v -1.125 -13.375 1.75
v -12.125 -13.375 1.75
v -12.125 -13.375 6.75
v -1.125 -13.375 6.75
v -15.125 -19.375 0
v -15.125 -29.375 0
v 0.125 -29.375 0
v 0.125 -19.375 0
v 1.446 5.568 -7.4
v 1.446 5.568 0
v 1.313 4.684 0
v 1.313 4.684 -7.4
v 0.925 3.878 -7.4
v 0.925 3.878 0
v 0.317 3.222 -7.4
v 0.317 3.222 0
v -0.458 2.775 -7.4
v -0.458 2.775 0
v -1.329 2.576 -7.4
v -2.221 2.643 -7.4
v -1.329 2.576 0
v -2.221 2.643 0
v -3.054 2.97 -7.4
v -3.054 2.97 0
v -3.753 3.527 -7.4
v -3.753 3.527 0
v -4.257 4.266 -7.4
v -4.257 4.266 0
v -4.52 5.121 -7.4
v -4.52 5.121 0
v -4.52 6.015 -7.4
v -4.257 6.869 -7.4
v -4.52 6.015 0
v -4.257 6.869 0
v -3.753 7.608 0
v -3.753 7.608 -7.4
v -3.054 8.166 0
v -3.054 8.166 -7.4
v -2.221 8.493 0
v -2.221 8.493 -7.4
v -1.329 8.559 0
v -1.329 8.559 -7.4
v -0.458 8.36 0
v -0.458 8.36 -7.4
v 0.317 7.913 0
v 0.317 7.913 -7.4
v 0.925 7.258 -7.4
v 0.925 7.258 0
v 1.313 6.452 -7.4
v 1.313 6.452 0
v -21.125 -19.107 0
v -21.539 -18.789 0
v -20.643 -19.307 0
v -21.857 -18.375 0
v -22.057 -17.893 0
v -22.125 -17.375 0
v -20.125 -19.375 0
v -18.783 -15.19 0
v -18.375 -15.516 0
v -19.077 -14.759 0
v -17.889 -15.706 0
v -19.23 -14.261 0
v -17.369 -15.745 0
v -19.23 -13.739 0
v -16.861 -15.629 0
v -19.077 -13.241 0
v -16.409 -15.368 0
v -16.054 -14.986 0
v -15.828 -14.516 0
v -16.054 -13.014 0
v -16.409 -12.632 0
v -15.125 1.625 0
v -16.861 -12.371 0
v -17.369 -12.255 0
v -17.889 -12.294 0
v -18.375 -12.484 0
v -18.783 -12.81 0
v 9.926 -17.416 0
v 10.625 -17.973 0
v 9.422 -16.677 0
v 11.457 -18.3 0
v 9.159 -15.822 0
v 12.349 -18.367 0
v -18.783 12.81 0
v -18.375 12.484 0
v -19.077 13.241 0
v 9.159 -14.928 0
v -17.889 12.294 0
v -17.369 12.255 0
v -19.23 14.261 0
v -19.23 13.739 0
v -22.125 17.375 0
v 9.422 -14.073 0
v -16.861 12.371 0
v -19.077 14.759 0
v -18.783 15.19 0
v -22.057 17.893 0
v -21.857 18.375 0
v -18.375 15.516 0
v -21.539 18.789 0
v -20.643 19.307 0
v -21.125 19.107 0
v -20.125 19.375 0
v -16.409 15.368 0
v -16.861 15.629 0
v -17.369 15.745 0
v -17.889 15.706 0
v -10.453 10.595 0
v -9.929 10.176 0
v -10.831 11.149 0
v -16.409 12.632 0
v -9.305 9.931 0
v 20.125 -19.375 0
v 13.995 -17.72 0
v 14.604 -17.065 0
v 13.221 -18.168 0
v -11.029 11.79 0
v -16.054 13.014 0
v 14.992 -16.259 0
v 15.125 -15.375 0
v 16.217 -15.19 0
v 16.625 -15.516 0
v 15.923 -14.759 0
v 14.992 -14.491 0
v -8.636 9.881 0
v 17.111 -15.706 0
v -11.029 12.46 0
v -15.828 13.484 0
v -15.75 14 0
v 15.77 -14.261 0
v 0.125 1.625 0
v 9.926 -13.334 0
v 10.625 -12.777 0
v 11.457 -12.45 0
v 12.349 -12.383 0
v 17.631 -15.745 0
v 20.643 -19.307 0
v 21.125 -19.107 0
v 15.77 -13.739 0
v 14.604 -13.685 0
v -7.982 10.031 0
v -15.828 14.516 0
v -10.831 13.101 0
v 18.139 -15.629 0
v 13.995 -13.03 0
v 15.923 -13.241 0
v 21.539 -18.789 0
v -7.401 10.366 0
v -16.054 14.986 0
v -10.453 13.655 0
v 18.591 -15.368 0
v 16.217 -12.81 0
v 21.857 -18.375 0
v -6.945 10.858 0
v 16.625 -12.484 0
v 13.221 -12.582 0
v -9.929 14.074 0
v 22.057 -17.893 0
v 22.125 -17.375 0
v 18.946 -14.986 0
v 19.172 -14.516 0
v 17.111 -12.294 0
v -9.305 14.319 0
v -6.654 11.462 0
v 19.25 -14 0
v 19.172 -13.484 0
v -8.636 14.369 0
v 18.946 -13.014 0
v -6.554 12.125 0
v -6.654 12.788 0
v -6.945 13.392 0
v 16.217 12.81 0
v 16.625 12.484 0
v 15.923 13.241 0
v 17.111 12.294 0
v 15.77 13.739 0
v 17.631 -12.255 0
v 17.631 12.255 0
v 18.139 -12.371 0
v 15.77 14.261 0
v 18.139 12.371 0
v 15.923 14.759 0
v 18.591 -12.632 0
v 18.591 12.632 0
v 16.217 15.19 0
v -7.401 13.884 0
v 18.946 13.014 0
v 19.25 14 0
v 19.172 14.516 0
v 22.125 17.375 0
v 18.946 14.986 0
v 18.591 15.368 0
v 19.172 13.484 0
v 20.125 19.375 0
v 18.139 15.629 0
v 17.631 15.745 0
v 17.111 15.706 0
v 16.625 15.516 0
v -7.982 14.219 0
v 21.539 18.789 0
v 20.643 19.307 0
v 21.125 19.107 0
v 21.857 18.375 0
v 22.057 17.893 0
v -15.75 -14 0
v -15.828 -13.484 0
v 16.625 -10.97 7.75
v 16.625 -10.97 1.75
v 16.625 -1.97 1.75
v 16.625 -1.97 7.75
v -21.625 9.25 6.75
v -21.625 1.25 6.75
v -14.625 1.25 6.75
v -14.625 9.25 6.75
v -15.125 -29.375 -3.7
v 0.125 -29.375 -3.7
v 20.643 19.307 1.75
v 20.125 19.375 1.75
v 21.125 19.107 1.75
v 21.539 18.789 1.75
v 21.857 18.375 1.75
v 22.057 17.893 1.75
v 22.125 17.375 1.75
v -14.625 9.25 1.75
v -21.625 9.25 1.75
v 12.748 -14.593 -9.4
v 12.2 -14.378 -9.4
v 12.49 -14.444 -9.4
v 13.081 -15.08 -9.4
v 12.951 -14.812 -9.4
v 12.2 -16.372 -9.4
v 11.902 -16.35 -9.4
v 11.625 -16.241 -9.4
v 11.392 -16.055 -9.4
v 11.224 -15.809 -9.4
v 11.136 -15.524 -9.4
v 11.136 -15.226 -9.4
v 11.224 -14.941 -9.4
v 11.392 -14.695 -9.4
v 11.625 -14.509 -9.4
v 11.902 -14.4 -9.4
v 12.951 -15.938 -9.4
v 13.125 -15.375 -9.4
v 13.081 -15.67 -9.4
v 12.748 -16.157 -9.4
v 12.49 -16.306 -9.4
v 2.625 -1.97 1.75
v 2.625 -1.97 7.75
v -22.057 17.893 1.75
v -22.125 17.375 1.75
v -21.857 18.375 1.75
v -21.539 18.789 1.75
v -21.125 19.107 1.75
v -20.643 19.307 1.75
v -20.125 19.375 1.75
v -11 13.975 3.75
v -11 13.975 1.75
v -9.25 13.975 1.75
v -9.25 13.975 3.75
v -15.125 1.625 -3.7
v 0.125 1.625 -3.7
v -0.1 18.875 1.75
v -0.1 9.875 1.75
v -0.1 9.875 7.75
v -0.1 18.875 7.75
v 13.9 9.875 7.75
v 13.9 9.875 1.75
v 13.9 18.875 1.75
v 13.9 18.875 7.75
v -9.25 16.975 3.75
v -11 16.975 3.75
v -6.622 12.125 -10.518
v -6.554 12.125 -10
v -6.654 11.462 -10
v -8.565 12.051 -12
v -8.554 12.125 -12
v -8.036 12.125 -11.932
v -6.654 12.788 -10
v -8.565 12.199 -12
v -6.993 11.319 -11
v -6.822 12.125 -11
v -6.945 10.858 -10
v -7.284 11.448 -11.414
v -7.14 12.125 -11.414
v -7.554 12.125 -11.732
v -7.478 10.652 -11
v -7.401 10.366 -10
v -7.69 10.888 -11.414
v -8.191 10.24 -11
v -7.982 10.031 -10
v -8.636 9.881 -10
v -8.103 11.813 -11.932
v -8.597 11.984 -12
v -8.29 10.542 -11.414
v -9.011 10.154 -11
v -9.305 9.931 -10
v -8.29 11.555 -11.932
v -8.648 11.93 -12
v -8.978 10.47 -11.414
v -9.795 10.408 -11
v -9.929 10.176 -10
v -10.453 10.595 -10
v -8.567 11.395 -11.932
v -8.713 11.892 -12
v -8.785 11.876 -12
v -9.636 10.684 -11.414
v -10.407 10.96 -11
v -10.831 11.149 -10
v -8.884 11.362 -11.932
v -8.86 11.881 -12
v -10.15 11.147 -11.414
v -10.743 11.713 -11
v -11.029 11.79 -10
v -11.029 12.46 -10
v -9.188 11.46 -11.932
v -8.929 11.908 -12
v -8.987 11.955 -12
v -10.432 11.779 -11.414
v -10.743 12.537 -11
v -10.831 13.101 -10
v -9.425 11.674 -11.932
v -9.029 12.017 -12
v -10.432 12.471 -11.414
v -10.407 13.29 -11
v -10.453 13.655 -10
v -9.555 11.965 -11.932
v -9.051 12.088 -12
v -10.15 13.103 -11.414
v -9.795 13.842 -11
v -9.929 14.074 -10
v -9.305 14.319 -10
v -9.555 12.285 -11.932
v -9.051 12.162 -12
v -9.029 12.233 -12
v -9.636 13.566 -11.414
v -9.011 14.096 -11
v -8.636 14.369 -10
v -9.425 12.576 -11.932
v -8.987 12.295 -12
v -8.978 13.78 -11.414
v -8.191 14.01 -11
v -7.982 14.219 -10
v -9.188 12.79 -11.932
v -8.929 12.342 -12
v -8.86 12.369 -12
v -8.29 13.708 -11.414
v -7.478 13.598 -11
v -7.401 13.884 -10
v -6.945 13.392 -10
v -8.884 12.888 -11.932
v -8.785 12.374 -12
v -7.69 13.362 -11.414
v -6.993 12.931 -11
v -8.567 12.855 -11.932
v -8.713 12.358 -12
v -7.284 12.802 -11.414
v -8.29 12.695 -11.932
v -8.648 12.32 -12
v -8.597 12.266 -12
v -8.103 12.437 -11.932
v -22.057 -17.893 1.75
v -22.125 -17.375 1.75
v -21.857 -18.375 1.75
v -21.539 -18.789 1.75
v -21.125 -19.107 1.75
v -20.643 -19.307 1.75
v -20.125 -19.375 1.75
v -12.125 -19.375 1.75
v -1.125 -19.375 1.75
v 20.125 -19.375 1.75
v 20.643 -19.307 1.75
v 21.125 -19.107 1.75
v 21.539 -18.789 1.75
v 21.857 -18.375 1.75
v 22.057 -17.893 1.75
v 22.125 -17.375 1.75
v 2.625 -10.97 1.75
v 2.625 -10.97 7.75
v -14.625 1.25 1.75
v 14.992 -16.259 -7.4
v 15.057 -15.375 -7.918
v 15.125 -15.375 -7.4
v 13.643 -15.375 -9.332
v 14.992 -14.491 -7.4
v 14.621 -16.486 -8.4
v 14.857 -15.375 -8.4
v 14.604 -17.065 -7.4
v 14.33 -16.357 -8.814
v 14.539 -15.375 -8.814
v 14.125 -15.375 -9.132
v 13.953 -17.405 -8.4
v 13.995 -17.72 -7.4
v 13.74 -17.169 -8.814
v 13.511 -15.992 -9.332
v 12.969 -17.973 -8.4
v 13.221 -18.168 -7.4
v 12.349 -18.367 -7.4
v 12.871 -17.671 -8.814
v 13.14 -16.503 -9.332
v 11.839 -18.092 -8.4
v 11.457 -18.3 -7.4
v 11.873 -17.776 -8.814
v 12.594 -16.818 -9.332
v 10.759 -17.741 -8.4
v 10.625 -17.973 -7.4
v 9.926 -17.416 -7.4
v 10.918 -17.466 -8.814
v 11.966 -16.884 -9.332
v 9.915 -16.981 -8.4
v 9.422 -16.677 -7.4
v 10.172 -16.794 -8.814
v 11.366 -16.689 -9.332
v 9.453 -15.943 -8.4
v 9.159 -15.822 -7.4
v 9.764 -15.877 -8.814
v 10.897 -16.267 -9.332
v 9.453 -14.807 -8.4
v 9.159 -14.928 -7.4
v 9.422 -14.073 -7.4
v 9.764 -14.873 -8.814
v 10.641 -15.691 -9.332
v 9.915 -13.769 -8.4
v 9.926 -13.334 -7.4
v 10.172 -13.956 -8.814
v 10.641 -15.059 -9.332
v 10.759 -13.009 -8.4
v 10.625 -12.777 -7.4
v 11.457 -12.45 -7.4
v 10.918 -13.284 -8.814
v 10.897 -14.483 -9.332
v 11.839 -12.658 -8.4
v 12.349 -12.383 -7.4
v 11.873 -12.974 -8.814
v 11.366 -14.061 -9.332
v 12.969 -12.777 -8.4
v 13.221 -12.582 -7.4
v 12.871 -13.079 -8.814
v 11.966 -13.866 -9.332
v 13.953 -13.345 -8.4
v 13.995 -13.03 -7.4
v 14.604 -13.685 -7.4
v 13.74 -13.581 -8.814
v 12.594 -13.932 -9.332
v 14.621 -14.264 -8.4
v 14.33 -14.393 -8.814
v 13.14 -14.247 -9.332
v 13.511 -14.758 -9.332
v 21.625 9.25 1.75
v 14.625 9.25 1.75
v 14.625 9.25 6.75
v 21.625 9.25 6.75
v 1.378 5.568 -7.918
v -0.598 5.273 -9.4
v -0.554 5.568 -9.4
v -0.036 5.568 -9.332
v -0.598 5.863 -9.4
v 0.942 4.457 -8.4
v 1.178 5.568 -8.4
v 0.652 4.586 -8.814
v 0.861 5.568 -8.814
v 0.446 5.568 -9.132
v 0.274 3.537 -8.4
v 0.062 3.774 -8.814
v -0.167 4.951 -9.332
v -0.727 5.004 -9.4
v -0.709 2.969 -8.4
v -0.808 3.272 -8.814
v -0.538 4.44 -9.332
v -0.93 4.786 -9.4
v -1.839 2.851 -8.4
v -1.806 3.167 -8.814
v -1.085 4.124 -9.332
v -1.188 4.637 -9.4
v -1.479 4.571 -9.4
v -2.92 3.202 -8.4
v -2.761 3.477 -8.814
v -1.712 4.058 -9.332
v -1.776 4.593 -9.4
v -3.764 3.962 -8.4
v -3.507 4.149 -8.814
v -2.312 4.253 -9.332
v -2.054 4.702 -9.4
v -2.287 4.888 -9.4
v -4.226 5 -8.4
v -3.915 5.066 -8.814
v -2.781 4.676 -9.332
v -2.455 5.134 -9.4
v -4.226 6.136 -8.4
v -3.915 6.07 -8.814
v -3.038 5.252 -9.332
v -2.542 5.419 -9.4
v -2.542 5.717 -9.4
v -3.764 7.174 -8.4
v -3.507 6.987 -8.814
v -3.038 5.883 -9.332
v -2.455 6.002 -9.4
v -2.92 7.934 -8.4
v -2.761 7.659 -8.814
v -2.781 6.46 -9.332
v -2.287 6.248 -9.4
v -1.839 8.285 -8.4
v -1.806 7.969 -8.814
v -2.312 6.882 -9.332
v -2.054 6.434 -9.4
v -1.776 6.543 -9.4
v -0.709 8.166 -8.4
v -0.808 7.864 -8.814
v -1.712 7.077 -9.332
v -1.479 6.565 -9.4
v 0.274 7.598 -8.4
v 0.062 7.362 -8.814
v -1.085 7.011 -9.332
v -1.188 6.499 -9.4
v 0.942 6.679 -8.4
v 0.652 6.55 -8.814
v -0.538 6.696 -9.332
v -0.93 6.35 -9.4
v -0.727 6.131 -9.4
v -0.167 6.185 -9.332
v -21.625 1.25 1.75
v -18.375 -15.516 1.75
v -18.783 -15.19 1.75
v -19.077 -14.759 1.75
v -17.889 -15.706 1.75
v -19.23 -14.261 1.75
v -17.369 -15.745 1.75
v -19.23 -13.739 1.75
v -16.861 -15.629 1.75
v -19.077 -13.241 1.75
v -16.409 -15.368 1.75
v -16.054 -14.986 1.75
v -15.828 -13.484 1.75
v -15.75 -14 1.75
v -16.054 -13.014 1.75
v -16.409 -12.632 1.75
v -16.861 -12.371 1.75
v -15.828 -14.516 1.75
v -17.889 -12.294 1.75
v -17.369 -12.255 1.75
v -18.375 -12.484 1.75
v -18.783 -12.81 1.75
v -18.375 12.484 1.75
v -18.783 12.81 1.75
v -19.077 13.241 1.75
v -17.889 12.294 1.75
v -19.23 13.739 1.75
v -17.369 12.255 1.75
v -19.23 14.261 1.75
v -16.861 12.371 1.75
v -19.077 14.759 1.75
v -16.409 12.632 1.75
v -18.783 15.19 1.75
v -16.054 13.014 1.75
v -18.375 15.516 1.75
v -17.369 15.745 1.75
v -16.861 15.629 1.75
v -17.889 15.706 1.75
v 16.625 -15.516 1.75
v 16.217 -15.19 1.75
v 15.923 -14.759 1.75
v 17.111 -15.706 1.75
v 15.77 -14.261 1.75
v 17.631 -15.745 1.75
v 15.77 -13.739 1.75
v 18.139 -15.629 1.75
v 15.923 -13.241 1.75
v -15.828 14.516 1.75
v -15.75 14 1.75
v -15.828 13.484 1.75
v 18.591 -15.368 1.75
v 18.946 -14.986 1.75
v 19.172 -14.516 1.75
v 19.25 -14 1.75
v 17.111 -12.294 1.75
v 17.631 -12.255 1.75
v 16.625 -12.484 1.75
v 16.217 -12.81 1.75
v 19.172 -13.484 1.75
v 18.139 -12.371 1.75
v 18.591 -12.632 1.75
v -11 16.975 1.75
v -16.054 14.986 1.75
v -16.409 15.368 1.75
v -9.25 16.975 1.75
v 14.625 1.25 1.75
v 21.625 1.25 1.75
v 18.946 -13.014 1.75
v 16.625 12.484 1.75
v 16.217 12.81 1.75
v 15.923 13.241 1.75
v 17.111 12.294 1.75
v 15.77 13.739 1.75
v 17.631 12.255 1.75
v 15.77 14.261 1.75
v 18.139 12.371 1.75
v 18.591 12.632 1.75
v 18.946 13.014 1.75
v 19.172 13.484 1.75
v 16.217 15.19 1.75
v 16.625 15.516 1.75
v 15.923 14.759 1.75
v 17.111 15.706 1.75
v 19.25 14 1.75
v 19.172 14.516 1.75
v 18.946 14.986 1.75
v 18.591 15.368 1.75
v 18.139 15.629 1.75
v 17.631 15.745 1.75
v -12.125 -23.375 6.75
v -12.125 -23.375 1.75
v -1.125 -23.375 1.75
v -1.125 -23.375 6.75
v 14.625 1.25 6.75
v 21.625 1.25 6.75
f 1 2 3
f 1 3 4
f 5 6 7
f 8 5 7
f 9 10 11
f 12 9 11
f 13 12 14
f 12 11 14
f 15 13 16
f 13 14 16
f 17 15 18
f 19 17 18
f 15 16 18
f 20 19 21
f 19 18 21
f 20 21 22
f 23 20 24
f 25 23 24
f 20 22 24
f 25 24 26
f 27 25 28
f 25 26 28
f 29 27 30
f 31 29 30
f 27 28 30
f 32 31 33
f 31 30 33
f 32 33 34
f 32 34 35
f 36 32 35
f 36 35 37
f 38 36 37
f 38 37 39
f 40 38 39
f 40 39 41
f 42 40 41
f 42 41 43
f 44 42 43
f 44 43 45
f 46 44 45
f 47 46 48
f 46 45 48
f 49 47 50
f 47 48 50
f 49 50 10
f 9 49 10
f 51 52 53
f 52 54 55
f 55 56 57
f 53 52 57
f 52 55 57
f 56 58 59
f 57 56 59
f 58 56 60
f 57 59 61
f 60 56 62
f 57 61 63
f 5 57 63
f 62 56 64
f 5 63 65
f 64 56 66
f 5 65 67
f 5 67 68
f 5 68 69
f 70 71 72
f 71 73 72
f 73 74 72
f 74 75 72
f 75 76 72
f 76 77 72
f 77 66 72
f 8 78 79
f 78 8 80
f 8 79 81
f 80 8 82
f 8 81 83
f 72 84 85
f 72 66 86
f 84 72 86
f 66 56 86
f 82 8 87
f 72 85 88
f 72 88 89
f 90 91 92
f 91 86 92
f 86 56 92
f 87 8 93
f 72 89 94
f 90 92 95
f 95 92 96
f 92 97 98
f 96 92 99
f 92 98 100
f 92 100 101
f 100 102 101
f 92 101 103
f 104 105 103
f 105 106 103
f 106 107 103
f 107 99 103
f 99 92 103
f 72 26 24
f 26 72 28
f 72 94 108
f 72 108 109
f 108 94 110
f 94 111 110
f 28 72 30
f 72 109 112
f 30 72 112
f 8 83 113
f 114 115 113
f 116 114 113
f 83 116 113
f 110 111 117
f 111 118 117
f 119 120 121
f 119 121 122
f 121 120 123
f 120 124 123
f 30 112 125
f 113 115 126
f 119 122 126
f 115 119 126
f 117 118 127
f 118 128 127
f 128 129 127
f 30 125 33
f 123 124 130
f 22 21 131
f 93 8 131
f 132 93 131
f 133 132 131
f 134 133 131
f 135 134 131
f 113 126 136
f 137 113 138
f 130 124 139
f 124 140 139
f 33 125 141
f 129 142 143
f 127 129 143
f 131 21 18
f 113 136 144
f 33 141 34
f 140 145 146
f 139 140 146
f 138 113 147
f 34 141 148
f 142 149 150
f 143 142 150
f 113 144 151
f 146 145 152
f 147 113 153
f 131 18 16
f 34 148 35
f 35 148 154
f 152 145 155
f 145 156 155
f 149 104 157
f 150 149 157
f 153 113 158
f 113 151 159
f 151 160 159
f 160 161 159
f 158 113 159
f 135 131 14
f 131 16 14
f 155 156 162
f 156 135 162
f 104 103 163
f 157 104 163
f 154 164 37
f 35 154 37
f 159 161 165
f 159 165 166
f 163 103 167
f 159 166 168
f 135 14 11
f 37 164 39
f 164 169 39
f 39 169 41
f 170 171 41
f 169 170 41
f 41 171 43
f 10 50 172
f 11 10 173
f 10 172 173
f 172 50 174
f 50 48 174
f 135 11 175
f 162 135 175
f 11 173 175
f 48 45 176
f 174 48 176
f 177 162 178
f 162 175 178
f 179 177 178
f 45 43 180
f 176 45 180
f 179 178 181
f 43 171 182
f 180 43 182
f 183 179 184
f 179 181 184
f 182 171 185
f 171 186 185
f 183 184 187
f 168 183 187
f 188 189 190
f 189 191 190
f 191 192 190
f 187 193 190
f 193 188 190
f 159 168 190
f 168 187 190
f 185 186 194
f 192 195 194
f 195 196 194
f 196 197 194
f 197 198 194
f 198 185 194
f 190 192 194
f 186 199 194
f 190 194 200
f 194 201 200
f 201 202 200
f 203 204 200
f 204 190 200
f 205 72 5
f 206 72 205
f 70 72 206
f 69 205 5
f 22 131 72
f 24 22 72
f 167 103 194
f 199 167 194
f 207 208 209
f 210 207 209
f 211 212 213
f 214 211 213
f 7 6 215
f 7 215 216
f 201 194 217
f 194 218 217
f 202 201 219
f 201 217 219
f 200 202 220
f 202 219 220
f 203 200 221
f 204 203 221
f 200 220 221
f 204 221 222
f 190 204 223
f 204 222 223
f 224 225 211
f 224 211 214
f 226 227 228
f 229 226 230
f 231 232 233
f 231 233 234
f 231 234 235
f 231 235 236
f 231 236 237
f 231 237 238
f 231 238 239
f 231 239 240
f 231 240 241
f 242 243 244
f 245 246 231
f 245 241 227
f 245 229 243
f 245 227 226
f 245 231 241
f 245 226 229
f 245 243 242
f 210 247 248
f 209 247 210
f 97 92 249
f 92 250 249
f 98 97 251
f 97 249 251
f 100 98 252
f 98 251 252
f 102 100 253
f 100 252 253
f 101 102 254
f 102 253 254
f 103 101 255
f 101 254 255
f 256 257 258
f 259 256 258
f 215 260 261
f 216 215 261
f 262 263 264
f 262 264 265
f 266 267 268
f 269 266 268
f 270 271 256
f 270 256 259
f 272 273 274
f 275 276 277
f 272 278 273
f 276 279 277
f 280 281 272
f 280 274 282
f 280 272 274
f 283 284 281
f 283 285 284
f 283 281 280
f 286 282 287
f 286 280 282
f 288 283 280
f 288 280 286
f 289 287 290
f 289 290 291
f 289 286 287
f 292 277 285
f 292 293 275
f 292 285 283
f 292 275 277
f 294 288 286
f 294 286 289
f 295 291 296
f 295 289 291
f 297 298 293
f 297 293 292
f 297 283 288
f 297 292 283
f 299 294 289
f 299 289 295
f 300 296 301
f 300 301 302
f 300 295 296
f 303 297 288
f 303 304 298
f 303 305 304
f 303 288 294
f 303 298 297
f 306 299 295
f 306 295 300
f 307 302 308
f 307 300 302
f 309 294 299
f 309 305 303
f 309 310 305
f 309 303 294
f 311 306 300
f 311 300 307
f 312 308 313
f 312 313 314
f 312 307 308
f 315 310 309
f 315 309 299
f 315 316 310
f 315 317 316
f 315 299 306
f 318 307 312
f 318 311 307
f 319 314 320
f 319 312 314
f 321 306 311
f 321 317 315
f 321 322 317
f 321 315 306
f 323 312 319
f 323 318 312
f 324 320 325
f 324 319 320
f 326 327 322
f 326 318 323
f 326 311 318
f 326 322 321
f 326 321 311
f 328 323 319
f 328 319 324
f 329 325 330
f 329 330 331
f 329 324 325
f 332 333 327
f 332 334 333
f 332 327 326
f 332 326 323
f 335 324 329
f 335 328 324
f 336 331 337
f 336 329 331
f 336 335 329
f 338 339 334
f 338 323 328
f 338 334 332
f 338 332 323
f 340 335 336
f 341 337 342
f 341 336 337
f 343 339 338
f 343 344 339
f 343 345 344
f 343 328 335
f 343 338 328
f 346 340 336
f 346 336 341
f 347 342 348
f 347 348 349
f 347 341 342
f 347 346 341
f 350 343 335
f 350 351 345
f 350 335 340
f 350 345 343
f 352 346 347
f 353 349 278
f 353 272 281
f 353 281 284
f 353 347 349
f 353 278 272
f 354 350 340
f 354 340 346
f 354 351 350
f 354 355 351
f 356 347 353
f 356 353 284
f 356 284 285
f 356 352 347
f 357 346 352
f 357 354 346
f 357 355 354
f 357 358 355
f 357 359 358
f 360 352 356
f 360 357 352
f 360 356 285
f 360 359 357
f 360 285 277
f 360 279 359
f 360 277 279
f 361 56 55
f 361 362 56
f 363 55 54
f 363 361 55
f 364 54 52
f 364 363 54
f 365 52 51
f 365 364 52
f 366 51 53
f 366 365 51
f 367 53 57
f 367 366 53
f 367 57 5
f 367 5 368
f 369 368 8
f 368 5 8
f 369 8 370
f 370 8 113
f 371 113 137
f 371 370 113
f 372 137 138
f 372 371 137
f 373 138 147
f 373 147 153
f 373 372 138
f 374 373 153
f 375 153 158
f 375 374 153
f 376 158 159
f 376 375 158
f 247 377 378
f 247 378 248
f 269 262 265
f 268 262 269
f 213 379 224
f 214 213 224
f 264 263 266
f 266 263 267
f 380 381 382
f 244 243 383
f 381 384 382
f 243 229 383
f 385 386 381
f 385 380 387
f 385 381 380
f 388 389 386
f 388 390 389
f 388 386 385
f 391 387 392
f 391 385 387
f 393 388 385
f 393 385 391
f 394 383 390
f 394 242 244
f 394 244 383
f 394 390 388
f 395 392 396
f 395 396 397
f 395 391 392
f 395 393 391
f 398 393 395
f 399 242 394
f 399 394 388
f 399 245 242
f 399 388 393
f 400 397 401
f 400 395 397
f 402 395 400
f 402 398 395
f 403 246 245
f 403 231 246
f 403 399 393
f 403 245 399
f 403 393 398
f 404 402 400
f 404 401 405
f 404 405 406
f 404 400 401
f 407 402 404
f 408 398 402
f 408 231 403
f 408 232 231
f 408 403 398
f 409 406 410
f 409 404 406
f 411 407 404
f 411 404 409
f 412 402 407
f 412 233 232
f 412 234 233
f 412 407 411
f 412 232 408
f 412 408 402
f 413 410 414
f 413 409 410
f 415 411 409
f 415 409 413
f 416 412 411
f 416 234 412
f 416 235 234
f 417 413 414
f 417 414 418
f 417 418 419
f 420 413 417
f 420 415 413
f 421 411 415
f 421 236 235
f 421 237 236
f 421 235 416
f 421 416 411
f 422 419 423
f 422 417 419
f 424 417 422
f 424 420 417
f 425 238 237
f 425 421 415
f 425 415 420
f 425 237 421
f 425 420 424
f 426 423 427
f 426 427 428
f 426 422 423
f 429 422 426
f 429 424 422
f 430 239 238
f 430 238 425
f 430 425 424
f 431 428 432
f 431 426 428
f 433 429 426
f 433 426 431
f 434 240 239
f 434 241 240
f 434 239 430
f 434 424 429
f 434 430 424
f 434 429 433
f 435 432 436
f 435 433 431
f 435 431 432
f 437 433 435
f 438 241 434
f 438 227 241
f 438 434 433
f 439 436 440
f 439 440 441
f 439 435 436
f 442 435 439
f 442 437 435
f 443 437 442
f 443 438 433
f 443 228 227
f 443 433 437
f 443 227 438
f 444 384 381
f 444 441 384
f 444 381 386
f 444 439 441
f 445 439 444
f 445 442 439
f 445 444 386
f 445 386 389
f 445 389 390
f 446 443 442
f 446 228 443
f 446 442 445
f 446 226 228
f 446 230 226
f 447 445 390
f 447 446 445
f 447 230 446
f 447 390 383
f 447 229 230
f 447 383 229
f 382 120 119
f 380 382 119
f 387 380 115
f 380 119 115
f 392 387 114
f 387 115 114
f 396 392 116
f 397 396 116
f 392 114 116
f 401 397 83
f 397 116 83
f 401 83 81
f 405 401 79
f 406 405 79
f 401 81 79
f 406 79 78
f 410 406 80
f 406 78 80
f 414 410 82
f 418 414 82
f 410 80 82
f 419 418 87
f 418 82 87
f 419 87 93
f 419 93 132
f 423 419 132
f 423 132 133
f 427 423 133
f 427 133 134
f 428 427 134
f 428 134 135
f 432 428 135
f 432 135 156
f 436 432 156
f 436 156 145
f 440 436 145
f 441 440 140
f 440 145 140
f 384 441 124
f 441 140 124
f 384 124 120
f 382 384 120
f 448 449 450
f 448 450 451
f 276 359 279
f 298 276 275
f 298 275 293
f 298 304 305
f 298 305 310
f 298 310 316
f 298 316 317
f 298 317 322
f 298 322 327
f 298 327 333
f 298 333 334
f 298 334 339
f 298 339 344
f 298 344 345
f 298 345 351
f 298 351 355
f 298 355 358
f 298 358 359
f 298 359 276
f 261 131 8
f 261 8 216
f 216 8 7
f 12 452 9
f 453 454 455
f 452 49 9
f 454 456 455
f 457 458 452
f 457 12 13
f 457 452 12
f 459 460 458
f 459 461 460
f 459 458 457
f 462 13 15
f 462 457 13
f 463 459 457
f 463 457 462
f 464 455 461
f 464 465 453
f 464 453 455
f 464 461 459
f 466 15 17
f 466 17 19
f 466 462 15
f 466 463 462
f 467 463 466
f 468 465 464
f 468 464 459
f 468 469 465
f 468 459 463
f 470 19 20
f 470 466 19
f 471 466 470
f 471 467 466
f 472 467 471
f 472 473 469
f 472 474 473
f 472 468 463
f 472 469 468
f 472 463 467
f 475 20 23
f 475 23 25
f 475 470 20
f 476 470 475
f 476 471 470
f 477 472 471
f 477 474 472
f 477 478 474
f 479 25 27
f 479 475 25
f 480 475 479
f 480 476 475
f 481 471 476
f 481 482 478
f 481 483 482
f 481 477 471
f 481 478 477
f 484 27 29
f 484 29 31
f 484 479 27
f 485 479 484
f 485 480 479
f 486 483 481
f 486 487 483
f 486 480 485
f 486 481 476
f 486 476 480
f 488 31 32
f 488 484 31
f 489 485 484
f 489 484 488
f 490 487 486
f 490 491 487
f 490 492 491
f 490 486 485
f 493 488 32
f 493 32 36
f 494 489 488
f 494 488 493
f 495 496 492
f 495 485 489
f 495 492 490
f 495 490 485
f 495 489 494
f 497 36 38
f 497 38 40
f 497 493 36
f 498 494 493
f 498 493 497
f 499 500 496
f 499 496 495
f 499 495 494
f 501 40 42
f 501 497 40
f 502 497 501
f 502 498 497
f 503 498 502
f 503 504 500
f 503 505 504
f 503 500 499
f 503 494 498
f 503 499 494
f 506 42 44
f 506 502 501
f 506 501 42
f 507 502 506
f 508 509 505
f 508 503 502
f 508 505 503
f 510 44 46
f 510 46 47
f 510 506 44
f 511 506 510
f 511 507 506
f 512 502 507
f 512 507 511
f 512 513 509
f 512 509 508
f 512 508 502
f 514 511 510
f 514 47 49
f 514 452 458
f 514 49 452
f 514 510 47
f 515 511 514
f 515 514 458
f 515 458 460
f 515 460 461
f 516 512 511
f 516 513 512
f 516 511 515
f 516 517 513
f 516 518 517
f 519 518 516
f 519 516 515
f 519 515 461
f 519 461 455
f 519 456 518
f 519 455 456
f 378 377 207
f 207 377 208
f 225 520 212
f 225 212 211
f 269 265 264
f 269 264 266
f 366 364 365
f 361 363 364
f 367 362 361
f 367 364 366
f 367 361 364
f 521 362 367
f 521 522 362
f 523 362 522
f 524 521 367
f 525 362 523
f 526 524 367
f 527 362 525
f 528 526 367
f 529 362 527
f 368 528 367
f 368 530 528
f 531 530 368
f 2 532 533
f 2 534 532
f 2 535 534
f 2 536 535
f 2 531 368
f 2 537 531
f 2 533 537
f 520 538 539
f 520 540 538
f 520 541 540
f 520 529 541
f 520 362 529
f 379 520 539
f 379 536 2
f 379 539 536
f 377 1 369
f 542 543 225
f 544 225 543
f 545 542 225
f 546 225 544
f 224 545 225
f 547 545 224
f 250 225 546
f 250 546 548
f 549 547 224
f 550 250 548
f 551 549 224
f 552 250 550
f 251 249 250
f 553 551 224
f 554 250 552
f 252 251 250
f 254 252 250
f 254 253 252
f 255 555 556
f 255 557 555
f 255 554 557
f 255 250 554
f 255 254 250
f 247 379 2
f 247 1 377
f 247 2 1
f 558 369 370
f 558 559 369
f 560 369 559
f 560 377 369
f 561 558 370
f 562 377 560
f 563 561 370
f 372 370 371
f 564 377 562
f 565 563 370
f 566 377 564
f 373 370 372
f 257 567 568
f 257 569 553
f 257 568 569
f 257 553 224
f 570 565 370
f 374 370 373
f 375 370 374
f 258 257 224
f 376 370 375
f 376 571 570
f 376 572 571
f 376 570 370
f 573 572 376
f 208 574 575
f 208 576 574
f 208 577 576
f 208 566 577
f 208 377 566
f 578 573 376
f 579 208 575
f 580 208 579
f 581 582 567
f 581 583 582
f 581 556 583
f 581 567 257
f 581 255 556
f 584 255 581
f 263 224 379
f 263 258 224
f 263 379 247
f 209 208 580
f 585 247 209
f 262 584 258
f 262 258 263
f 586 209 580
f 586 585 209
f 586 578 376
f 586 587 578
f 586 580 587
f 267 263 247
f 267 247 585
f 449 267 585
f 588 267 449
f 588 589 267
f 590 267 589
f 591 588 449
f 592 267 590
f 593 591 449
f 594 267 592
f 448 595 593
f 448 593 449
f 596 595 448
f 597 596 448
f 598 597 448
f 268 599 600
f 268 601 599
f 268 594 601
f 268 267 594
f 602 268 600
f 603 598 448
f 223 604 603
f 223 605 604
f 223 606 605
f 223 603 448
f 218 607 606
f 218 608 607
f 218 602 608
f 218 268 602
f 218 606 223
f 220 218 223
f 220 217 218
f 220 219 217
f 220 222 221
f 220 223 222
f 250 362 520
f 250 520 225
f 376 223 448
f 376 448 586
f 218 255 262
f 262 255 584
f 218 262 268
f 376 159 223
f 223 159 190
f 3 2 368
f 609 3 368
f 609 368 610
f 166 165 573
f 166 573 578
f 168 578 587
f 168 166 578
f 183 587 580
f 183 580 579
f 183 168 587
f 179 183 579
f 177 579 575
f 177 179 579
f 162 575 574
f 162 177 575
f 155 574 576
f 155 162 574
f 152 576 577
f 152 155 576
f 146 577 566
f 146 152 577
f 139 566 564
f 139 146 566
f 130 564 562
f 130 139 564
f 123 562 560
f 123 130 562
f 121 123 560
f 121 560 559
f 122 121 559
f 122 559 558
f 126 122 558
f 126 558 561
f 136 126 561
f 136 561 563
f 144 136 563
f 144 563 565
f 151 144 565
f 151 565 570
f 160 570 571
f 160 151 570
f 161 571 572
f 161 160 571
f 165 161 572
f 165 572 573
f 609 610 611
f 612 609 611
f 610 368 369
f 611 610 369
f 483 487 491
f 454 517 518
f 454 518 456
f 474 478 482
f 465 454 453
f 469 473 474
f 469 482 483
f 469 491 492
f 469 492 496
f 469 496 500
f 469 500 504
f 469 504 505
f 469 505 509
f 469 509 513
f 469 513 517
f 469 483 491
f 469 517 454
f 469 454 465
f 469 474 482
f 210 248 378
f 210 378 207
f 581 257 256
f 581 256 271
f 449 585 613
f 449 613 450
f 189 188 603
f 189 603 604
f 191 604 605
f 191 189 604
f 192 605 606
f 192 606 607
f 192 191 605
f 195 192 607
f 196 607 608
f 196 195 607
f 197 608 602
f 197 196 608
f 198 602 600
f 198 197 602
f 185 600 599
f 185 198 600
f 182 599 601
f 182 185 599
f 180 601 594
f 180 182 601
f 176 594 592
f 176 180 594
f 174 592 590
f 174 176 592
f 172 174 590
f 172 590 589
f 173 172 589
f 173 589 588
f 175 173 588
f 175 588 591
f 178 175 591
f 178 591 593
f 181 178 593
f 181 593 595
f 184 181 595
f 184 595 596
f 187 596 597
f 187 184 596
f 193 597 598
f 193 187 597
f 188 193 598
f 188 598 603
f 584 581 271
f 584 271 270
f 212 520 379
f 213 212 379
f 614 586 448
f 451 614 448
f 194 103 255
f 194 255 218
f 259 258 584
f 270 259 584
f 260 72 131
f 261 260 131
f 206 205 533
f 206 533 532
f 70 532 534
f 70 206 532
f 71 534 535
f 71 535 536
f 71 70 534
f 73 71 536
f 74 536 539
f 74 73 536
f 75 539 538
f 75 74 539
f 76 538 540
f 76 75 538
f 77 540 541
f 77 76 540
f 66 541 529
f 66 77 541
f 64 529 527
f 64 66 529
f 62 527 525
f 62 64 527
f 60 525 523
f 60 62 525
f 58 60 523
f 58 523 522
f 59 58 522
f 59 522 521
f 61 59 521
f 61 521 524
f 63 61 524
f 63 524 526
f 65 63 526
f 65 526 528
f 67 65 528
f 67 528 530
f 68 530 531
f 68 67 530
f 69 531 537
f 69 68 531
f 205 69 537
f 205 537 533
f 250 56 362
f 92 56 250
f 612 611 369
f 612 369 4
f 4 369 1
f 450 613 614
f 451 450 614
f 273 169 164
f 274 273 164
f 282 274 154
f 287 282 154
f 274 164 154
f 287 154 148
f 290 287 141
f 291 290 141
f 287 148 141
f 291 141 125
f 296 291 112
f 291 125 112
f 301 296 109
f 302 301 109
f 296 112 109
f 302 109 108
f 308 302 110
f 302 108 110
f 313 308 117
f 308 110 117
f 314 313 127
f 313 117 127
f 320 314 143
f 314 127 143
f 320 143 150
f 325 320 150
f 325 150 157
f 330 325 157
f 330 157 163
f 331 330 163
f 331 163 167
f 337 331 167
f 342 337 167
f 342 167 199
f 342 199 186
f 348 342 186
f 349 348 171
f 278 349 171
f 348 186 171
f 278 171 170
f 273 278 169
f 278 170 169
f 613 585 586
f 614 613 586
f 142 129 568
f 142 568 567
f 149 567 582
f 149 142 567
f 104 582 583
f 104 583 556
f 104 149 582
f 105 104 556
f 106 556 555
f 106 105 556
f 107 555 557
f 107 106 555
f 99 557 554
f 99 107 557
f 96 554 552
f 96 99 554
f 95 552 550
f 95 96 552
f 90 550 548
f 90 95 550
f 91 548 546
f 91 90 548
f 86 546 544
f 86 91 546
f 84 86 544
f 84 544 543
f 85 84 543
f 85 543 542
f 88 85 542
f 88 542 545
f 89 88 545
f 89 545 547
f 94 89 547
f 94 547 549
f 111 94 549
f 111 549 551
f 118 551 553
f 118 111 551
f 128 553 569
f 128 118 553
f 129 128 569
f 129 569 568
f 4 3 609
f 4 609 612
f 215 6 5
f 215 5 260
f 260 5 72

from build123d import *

# Parameters (mm, degrees)
F0_W      = 44.25
F0_H      = 38.75
F0_R      = 1.75
F1_DEPTH  = 1.75
F2_R      = 2
F3_W      = 14
F3_H      = 9
F4_DEPTH  = 6
F3_W_2    = 7
F3_H_2    = 8
F5_DEPTH  = 5
F3_W_3    = 1.75
F3_H_3    = 3
F6_DEPTH  = 2
F3_W_4    = 11
F3_H_4    = 6
F3_H_5    = 4
F7_DEPTH  = 5
F8_R      = 3
F9_DEPTH  = 9.4
F8_R_2    = 2.25
F10_DEPTH = 12
F8_W      = 15.25
F8_H      = 21
F8_H_2    = 10
F11_DEPTH = 3.7
F12_R     = 2
F13_R     = 2


with BuildPart() as f1:
    # F0 (on Top) → F1 (new body)
    with BuildSketch(Plane.XY):
        Rectangle(F0_W, F0_H)
        with Locations((-17.5, -14)):
            Circle(F0_R, mode=Mode.SUBTRACT)
        with Locations((17.5, -14)):
            Circle(F0_R, mode=Mode.SUBTRACT)
        with Locations((-17.5, 14)):
            Circle(F0_R, mode=Mode.SUBTRACT)
        with Locations((17.5, 14)):
            Circle(F0_R, mode=Mode.SUBTRACT)
    extrude(amount=F1_DEPTH)

    # F2
    f2_edges = [f1.edges().sort_by_distance(p)[0] for p in [
        (22.125, -19.375, 0.875),
        (-22.125, -19.375, 0.875),
        (-22.125, 19.375, 0.875),
        (22.125, 19.375, 0.875),
    ]]
    fillet(f2_edges, radius=F2_R)

    # F3 (on face) → F4 (join)
    with BuildSketch(Plane.XY.offset(1.75)):
        with Locations((6.9, 14.375)):
            Rectangle(F3_W, F3_H)
        with Locations((9.625, -6.47)):
            Rectangle(F3_W, F3_H)
    extrude(amount=F4_DEPTH)

    # F3 (on face) → F5 (join)
    with BuildSketch(Plane.XY.offset(1.75)):
        with Locations((-18.125, 5.25)):
            Rectangle(F3_W_2, F3_H_2)
        with Locations((18.125, 5.25)):
            Rectangle(F3_W_2, F3_H_2)
    extrude(amount=F5_DEPTH)

    # F3 (on face) → F6 (join)
    with BuildSketch(Plane.XY.offset(1.75)):
        with Locations((-10.125, 15.475)):
            Rectangle(F3_W_3, F3_H_3)
    extrude(amount=F6_DEPTH)

    # F3 (on face) → F7 (join)
    with BuildSketch(Plane.XY.offset(1.75)):
        with Locations((-6.625, -16.375)):
            Rectangle(F3_W_4, F3_H_4)
        with Locations((-6.625, -21.375)):
            Rectangle(F3_W_4, F3_H_5)
    extrude(amount=F7_DEPTH)

    # F8 (on face) → F9 (join)
    with BuildSketch(Plane(origin=(0, 0, 0), x_dir=(1, 0, 0), z_dir=(0, 0, -1))):
        with Locations((-1.553635, -5.567789)):
            Circle(F8_R)
        with Locations((12.125, 15.375)):
            Circle(F8_R)
    extrude(amount=F9_DEPTH)

    # F8 (on face) → F10 (join)
    with BuildSketch(Plane(origin=(0, 0, 0), x_dir=(1, 0, 0), z_dir=(0, 0, -1))):
        with Locations((-8.803919, -12.125)):
            Circle(F8_R_2)
    extrude(amount=F10_DEPTH)

    # F8 (on face) → F11 (join)
    with BuildSketch(Plane(origin=(0, 0, 0), x_dir=(1, 0, 0), z_dir=(0, 0, -1))):
        with Locations((-7.5, 8.875)):
            Rectangle(F8_W, F8_H)
        with Locations((-7.5, 24.375)):
            Rectangle(F8_W, F8_H_2)
    extrude(amount=F11_DEPTH)

    # F12
    f12_edges = [f1.edges().sort_by_distance(p)[0] for p in [
        (9.125, -15.375, -9.4),
        (-4.553635, 5.567789, -9.4),
    ]]
    fillet(f12_edges, radius=F12_R)

    # F13
    f13_edges = [f1.edges().sort_by_distance(p)[0] for p in [
        (-11.053919, 12.125, -12),
    ]]
    fillet(f13_edges, radius=F13_R)


solid = f1.part
